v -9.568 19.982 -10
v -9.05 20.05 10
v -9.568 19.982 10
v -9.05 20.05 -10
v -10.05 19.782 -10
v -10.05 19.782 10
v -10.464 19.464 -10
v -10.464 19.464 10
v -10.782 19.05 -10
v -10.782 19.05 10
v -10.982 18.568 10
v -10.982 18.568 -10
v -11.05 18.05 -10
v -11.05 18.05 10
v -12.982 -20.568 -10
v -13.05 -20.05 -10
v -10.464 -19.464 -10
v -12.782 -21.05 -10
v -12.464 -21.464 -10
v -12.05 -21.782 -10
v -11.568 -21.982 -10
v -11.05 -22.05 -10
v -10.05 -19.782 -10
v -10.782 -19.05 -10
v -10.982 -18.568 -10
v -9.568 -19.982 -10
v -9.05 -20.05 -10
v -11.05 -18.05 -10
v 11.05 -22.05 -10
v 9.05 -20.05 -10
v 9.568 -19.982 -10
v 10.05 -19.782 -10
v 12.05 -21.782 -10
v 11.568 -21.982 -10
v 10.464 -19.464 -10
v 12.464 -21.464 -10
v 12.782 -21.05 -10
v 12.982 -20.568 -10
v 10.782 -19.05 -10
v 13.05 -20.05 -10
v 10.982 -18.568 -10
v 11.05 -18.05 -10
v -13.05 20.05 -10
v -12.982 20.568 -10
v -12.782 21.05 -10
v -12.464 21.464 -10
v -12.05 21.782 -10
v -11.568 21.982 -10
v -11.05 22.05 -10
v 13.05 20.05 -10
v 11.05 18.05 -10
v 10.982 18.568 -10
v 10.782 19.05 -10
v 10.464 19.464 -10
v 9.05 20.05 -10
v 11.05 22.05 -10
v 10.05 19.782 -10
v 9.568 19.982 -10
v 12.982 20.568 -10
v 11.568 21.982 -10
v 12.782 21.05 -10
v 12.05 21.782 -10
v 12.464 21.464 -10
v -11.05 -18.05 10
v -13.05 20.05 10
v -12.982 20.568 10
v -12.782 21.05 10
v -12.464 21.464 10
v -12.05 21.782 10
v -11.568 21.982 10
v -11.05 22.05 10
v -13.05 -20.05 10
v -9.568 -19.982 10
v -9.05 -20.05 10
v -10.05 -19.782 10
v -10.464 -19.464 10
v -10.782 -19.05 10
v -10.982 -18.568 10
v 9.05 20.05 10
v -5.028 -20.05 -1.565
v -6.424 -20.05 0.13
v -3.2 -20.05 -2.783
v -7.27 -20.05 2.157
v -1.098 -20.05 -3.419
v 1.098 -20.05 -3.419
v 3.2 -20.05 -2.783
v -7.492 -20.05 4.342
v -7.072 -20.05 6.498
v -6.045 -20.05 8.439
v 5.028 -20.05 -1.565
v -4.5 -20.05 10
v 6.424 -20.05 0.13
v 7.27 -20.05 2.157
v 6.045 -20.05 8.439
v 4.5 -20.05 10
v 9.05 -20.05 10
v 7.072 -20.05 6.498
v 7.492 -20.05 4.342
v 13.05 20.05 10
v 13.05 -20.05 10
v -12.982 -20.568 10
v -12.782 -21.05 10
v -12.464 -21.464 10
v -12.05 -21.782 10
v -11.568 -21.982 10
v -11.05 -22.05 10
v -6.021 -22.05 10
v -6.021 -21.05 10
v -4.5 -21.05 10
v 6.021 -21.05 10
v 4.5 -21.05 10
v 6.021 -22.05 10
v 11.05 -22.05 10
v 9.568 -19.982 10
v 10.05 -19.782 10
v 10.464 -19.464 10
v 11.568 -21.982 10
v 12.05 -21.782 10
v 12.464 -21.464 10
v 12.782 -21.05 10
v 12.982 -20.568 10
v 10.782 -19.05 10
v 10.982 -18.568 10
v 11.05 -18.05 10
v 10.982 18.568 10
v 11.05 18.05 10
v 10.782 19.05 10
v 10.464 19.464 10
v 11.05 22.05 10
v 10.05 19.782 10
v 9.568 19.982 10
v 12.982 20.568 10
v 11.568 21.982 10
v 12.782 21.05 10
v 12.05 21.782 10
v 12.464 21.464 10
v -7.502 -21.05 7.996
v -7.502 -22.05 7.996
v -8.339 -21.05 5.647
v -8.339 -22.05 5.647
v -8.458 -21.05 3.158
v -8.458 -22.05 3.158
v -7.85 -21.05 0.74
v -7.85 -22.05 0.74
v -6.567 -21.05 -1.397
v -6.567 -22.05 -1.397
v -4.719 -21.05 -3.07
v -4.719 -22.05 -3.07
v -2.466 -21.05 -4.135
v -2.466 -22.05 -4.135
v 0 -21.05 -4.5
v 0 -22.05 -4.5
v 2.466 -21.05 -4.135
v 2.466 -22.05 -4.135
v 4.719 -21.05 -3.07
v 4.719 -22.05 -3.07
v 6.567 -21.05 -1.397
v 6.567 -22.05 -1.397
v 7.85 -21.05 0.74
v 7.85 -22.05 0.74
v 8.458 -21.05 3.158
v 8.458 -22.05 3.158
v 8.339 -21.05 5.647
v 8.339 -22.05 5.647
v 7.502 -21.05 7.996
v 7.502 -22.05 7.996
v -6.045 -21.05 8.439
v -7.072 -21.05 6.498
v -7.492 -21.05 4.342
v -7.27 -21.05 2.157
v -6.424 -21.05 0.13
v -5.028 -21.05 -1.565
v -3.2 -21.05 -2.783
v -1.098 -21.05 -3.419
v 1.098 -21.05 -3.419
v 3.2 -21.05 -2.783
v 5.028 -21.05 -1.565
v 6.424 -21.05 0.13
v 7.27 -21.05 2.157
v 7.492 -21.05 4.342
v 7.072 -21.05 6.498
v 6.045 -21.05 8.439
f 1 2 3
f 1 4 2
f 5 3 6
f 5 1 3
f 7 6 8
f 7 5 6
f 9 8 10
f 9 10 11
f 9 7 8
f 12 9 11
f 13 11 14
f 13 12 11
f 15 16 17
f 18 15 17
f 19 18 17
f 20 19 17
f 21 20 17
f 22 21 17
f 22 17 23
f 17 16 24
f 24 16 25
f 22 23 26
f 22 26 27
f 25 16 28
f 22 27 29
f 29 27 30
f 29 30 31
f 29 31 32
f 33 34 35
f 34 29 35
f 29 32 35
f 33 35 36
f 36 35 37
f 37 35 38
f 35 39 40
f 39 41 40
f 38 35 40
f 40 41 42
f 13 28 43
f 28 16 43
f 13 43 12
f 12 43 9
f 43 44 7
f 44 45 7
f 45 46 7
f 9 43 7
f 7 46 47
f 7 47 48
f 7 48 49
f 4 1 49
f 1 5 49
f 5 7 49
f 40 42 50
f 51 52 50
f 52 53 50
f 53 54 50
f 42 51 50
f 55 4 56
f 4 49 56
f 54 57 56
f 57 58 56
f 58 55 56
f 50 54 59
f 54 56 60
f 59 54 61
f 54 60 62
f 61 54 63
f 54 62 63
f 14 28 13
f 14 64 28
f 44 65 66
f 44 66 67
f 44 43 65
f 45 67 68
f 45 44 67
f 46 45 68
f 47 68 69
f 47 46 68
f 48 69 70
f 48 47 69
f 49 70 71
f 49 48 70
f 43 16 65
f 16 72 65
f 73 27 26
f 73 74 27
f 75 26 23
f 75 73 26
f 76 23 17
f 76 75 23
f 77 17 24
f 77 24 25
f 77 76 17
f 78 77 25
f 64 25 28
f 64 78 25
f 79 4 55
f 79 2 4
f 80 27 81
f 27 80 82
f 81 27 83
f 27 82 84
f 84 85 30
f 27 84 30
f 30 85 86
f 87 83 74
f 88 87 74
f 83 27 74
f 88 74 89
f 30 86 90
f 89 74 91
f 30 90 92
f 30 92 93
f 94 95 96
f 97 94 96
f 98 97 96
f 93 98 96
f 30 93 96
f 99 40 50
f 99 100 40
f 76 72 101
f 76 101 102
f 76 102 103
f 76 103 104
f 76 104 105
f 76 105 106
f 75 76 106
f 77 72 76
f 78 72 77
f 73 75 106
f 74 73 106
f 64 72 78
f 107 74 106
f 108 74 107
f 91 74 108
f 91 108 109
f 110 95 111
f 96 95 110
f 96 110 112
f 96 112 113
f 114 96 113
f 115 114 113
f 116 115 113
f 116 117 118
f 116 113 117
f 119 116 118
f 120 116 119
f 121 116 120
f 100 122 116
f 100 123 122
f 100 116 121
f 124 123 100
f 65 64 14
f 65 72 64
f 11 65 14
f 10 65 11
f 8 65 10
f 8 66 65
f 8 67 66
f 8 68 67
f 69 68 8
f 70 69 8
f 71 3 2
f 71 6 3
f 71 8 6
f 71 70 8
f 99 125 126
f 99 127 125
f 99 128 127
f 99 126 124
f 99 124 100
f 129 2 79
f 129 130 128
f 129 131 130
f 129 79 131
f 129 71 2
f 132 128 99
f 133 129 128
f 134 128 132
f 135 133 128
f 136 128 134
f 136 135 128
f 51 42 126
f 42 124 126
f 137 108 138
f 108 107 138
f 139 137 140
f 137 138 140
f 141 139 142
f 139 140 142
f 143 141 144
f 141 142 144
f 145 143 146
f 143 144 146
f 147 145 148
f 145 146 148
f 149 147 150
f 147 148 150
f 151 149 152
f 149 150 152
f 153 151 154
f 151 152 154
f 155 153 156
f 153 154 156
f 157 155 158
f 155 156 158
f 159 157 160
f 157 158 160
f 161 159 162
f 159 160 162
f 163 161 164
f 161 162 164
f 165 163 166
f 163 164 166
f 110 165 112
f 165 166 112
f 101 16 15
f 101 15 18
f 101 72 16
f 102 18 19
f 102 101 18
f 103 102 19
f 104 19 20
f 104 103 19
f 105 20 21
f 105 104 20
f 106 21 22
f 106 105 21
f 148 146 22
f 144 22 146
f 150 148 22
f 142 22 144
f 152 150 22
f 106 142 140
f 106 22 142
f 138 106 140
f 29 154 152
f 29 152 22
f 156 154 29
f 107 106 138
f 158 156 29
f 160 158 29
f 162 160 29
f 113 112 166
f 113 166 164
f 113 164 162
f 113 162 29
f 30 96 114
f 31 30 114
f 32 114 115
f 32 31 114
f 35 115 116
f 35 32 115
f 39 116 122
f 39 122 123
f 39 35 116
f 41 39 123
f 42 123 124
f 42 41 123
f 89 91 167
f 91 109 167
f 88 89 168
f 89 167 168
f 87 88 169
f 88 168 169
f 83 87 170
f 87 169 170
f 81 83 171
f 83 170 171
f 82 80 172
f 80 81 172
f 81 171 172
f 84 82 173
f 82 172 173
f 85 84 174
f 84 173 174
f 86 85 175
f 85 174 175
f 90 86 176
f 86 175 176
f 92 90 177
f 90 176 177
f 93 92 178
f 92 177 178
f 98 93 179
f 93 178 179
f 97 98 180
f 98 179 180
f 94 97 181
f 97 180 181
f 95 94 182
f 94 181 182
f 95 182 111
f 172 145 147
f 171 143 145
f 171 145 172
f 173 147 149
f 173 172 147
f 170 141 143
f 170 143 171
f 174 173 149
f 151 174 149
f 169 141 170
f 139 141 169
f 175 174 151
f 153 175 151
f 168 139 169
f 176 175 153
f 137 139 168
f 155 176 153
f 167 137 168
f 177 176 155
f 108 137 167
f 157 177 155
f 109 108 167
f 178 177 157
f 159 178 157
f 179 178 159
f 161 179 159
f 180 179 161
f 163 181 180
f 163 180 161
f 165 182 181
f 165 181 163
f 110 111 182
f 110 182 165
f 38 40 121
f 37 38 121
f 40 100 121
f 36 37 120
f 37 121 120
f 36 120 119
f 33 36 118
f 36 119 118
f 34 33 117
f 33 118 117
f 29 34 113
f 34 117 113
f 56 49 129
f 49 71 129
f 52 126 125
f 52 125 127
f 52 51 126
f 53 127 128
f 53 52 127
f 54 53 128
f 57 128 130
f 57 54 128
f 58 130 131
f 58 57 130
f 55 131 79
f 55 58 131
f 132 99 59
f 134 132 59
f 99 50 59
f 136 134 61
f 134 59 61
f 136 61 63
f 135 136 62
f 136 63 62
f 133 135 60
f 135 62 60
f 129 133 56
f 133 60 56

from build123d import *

# Parameters (mm, degrees)
F0_W     = 26.1
F0_H     = 44.1
F0_W_2   = 22.1
F0_H_2   = 40.1
F1_DEPTH = 10
F2_R     = 7.5
F3_DEPTH = 10
F4_R     = 8.5
F4_R_2   = 7.5
F5_DEPTH = 1
F6_R     = 2
F7_R     = 2


with BuildPart() as f1:
    # F0 (on Top) → F1 (new body, symmetric)
    with BuildSketch(Plane.XY):
        Rectangle(F0_W, F0_H)
        Rectangle(F0_W_2, F0_H_2, mode=Mode.SUBTRACT)
    extrude(amount=F1_DEPTH, both=True)

    # F2 (on face) → F3 (cut)
    with BuildSketch(Plane.XZ.offset(22.05)):
        with Locations((0, 4)):
            Circle(F2_R)
    extrude(amount=-F3_DEPTH, mode=Mode.SUBTRACT)

    # F4 (on face) → F5 (cut)
    with BuildSketch(Plane.XZ.offset(22.05)):
        with Locations((0, 4)):
            Circle(F4_R)
        with Locations((0, 4)):
            Circle(F4_R_2, mode=Mode.SUBTRACT)
    extrude(amount=-F5_DEPTH, mode=Mode.SUBTRACT)

    # F6
    f6_edges = [f1.edges().sort_by_distance(p)[0] for p in [
        (-13.05, -22.05, 0),
        (13.05, -22.05, 0),
        (13.05, 22.05, 0),
        (-13.05, 22.05, 0),
    ]]
    fillet(f6_edges, radius=F6_R)

    # F7
    f7_edges = [f1.edges().sort_by_distance(p)[0] for p in [
        (-11.05, 20.05, 0),
        (11.05, 20.05, 0),
        (11.05, -20.05, 0),
        (-11.05, -20.05, 0),
    ]]
    fillet(f7_edges, radius=F7_R)


solid = f1.part
